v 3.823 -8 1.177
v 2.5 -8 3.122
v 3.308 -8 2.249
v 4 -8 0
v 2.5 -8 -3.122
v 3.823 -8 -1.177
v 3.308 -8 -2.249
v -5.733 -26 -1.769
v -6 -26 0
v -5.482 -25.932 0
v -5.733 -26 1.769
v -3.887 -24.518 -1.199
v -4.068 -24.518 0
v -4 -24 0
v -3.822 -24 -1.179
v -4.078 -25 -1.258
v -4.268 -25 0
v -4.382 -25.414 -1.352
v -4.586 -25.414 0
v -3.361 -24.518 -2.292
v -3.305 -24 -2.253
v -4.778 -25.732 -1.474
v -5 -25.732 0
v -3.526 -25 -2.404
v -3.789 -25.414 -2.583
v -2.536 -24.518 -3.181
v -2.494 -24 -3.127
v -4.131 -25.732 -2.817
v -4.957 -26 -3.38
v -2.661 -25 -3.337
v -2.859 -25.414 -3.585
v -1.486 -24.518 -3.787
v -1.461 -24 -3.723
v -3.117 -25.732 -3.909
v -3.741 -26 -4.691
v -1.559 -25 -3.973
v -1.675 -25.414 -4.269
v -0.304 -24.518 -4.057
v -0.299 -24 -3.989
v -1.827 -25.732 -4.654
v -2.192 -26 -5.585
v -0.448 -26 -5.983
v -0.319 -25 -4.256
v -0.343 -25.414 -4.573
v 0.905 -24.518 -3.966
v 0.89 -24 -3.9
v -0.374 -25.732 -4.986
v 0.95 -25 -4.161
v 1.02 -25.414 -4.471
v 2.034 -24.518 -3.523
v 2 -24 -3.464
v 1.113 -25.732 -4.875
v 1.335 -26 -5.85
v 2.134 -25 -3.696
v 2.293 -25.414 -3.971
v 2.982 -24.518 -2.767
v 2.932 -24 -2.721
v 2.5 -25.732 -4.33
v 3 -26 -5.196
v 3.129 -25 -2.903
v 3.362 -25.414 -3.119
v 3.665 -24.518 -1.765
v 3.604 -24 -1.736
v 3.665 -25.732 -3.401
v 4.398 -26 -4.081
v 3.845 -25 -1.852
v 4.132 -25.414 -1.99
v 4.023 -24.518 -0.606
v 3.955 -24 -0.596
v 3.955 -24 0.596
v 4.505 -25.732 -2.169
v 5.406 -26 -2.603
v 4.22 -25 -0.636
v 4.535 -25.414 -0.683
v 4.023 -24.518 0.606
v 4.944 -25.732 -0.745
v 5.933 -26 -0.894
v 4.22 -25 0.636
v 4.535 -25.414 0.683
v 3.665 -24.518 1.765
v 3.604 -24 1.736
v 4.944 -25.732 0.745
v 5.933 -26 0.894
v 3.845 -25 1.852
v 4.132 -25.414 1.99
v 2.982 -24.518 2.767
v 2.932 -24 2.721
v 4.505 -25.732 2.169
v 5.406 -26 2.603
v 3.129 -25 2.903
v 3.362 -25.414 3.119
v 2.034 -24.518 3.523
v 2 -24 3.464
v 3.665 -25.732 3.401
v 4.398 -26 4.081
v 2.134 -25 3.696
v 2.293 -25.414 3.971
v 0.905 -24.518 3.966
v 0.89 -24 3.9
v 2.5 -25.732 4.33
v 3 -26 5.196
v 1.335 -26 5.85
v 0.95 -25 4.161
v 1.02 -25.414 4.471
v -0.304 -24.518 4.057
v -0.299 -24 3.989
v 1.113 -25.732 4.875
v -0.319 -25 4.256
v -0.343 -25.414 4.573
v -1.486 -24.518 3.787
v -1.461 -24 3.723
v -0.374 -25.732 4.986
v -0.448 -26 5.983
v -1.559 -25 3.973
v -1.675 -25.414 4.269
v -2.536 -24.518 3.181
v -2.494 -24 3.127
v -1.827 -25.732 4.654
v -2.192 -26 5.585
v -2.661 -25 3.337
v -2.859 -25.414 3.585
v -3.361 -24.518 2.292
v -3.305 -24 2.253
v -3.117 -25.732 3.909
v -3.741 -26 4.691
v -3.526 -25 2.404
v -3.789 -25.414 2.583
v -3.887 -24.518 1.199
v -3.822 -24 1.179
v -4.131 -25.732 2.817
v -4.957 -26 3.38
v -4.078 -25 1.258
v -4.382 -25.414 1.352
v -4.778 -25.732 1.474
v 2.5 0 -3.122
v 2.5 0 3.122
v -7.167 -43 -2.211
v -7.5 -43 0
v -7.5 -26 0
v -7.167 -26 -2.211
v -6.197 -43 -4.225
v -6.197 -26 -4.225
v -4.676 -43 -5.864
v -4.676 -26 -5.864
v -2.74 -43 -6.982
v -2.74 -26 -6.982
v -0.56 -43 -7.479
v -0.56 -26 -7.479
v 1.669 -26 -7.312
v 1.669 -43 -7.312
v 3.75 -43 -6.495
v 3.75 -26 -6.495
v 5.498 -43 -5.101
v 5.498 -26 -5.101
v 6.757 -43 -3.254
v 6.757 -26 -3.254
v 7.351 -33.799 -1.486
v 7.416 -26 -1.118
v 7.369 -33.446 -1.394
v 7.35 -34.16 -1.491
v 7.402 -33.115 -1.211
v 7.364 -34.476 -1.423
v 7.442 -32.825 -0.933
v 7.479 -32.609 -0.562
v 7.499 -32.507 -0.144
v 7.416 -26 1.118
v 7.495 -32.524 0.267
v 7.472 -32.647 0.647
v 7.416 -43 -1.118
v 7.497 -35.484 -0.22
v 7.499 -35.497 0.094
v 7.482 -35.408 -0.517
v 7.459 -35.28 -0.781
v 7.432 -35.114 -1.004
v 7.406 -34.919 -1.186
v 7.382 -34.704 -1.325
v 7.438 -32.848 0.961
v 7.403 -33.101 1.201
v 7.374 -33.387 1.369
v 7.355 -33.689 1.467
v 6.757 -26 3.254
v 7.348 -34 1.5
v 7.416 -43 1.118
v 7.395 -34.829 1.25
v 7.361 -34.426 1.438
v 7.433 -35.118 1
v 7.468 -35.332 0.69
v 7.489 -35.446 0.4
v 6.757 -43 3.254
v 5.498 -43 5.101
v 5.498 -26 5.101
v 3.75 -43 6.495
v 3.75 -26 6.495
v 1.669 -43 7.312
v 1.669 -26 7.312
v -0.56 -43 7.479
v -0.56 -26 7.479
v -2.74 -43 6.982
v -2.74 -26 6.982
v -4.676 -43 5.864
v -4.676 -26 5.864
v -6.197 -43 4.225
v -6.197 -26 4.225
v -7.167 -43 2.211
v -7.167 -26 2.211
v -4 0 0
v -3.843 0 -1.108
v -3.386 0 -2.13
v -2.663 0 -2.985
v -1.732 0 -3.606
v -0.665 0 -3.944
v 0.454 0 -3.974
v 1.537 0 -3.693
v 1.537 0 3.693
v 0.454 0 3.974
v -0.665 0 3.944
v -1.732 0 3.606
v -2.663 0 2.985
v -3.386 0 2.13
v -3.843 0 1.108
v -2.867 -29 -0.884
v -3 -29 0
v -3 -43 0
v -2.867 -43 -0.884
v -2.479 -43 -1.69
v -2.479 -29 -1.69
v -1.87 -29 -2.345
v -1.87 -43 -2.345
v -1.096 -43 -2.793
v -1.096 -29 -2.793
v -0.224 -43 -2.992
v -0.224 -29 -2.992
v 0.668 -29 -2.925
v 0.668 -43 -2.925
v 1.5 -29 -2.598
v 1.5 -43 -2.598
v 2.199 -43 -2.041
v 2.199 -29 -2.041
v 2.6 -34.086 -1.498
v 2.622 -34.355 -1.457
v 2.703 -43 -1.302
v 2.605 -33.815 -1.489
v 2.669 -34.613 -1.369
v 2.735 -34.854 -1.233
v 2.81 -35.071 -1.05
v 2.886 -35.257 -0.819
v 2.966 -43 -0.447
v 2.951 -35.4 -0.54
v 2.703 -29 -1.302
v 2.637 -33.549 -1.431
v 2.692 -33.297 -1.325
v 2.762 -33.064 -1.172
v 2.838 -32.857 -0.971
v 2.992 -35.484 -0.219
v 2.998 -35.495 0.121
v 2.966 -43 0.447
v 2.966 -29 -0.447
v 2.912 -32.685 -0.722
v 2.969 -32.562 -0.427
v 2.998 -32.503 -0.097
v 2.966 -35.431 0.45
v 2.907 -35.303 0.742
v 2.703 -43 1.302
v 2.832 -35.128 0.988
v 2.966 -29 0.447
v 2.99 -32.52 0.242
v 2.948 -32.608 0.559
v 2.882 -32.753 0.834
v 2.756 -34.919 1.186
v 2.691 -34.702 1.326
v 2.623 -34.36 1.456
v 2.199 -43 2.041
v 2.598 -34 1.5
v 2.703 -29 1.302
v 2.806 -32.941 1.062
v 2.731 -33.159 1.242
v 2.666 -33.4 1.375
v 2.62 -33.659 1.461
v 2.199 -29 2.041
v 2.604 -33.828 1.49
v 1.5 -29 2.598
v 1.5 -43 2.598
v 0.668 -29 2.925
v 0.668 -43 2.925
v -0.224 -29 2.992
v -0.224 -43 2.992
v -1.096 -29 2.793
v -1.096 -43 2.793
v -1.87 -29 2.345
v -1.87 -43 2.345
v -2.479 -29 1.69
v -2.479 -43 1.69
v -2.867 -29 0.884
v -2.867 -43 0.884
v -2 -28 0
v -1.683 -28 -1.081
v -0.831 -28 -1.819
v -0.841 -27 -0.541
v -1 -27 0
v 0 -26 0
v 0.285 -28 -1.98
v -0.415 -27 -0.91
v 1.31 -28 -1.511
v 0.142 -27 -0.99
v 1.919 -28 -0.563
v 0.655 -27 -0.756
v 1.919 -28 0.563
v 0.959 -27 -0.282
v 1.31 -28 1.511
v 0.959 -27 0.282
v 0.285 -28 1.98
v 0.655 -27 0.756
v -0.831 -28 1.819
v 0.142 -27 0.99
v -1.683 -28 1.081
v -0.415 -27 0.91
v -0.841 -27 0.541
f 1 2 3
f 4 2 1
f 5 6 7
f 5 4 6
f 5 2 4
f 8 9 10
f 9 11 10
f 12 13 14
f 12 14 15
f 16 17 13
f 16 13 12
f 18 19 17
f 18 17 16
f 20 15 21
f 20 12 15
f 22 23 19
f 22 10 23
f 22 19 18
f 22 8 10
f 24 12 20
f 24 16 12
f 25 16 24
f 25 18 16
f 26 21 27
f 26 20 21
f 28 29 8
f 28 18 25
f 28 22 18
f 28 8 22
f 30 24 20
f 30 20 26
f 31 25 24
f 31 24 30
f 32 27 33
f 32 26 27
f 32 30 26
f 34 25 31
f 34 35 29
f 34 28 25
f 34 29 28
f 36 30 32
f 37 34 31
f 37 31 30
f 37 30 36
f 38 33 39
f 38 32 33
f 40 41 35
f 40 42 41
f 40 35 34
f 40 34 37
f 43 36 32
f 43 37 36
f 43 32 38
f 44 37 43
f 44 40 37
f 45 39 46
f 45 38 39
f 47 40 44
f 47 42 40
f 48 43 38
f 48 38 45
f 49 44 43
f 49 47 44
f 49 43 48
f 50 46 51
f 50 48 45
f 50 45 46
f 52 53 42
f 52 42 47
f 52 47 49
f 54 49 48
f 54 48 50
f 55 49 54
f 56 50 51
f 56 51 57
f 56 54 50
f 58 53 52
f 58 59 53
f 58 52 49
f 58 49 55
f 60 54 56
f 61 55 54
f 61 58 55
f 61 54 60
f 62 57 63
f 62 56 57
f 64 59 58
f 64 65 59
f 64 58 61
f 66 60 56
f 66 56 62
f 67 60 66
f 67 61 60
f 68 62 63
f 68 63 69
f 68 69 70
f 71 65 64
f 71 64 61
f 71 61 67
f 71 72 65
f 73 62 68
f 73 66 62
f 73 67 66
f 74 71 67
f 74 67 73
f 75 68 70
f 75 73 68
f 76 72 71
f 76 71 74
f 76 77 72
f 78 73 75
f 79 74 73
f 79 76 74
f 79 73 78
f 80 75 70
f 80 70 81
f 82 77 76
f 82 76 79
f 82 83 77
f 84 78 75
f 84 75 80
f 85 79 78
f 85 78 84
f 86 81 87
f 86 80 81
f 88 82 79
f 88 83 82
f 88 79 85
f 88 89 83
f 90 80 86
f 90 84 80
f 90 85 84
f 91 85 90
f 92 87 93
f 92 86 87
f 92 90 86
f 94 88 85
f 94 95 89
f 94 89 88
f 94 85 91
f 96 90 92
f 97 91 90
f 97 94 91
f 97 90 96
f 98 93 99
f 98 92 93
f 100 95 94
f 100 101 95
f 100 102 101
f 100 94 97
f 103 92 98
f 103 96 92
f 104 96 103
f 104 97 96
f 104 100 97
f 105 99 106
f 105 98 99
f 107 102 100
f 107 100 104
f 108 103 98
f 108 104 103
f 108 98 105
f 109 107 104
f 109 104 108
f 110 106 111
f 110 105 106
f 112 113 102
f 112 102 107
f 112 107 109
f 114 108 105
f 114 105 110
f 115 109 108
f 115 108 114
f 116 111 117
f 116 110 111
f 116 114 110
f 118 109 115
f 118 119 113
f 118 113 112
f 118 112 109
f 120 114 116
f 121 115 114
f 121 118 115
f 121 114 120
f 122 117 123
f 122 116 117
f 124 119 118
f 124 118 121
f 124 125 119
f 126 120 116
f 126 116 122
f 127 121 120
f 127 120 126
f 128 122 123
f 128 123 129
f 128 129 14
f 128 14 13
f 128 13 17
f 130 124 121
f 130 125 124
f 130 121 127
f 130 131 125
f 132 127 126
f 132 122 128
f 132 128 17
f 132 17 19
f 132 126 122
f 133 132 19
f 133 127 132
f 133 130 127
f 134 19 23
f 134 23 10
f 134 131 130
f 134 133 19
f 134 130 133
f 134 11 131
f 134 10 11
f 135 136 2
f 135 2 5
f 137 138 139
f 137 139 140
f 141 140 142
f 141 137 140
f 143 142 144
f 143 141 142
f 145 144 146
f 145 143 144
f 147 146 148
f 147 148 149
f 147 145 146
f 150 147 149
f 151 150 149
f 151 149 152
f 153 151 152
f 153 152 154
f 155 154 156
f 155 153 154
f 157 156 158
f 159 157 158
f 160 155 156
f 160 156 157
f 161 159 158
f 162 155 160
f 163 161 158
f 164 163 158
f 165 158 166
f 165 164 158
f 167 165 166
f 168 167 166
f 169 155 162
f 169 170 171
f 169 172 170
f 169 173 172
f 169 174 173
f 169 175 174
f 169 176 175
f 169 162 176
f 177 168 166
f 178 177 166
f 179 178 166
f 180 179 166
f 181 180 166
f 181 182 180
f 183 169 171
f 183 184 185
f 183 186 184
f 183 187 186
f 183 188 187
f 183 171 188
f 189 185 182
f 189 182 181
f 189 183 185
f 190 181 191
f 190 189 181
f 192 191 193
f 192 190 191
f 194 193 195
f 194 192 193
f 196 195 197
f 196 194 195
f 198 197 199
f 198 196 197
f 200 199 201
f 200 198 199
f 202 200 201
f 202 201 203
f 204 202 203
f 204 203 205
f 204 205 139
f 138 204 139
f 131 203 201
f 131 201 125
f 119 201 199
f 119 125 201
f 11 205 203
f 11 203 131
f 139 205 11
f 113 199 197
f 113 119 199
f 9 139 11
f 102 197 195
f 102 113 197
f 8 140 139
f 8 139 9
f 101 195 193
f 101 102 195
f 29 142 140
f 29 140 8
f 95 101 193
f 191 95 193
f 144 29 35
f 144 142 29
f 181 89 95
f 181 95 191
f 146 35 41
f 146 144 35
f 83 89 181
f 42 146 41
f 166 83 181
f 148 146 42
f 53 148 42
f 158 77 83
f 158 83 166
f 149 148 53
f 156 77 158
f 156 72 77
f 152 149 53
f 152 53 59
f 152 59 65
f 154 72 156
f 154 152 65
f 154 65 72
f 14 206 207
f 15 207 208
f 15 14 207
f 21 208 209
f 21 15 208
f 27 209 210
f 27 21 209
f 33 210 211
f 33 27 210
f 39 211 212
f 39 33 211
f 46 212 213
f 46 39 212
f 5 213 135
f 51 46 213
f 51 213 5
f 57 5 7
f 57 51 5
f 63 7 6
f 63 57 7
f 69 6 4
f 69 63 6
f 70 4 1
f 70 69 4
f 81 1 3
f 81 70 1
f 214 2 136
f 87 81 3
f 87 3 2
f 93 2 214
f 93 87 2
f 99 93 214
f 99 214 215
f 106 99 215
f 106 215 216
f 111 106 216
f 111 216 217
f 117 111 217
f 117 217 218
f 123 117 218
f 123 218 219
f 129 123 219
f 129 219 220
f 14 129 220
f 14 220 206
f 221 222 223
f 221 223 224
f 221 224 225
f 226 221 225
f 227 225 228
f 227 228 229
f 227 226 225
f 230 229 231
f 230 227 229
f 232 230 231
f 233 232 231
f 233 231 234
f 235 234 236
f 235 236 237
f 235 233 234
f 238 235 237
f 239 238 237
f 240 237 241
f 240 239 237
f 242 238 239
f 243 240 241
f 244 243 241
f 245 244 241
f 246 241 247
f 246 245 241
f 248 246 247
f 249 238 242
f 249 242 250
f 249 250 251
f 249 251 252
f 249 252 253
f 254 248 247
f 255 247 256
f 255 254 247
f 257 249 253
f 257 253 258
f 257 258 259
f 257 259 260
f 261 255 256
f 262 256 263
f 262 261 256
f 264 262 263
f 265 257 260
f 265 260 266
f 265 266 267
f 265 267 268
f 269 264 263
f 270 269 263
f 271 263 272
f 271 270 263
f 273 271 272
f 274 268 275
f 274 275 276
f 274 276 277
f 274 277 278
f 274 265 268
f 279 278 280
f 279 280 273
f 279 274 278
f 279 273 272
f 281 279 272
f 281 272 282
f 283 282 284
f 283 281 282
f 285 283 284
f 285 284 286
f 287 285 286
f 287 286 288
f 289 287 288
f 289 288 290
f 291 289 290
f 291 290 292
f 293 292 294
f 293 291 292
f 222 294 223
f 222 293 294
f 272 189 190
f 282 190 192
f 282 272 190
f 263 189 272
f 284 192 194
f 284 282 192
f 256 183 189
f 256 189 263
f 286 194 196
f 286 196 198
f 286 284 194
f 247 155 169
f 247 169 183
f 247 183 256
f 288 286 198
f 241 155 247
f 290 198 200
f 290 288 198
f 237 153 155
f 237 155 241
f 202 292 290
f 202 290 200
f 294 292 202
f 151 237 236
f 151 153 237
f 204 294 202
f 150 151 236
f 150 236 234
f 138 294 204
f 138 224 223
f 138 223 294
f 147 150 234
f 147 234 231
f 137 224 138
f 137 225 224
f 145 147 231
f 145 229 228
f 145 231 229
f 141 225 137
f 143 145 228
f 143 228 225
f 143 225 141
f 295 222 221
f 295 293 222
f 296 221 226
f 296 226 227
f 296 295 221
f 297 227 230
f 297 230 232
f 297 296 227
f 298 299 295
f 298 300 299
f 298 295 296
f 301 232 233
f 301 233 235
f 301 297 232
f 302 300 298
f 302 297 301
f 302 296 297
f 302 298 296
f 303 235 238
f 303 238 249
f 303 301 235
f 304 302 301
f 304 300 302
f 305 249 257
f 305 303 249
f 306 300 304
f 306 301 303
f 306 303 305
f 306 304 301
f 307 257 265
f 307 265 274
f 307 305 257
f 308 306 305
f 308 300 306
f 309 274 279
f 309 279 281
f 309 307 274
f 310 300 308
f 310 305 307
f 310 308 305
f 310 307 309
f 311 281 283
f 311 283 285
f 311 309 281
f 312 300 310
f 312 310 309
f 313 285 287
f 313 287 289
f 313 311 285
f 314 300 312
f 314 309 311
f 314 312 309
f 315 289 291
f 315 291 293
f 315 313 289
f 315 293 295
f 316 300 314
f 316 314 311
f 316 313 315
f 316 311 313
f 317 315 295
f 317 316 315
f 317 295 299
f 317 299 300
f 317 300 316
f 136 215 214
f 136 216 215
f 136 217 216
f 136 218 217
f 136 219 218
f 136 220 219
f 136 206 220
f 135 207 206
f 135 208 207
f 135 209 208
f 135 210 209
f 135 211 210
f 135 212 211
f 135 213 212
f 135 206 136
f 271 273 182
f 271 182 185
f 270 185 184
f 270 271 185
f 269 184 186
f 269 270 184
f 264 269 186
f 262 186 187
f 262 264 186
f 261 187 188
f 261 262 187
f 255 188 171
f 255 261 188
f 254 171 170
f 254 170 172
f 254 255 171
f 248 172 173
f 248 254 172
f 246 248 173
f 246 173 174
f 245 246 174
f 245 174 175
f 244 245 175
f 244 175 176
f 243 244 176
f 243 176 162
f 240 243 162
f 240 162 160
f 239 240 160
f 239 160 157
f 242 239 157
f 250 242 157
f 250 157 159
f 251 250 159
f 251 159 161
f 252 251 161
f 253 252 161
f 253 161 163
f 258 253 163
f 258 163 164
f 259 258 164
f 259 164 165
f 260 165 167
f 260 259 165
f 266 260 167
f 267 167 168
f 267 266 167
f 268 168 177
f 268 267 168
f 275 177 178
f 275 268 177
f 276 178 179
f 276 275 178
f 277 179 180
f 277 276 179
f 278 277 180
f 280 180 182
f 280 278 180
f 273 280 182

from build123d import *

# Parameters (mm, degrees)
CONG_1_R                = 2
ESQUISSE2_W             = 1.5
ESQUISSE2_H             = 6.244997998
ENL_V_MAT_EXTRU_1_DEPTH = 8
ESQUISSE3_R             = 1.5
ENL_V_MAT_EXTRU_2_DEPTH = 45.288824776


with BuildPart() as part:
    # Esquisse1 → Révolution1 (revolve)
    with BuildSketch(Plane.XY, mode=Mode.PRIVATE) as r_volution1_sk:
        Polygon((0, 0), (4, 0), (4, -26), (7.5, -26), (7.5, -43), (3, -43), (3, -29), (0, -26), align=None)
    revolve(r_volution1_sk.sketch.rotate(Axis((0, -26, 0), (0, -1, 0)), 180), axis=Axis((0, -26, 0), (0, -1, 0)))

    # Congé1
    cong_1_edges = [part.edges().sort_by_distance(p)[0] for p in [
        (4, -26, 0),
    ]]
    fillet(cong_1_edges, radius=CONG_1_R)

    # Esquisse2 → Enlèv. mat.-Extru.1 (cut)
    with BuildSketch(Plane(origin=(0, 0, 0), x_dir=(1, 0, 0), z_dir=(0, 1, 0))):
        with Locations((3.25, 0)):
            Rectangle(ESQUISSE2_W, ESQUISSE2_H)
    extrude(amount=-ENL_V_MAT_EXTRU_1_DEPTH, mode=Mode.SUBTRACT)

    # Esquisse3 → Enlèv. mat.-Extru.2 (cut, through all)
    with BuildSketch(Plane(origin=(0, 0, 0), x_dir=(0, 0, -1), z_dir=(1, 0, 0))):
        with Locations(Location((0, -34, 0), (0, 0, 180))):
            Circle(ESQUISSE3_R)
    extrude(amount=ENL_V_MAT_EXTRU_2_DEPTH, mode=Mode.SUBTRACT)


solid = part.part
